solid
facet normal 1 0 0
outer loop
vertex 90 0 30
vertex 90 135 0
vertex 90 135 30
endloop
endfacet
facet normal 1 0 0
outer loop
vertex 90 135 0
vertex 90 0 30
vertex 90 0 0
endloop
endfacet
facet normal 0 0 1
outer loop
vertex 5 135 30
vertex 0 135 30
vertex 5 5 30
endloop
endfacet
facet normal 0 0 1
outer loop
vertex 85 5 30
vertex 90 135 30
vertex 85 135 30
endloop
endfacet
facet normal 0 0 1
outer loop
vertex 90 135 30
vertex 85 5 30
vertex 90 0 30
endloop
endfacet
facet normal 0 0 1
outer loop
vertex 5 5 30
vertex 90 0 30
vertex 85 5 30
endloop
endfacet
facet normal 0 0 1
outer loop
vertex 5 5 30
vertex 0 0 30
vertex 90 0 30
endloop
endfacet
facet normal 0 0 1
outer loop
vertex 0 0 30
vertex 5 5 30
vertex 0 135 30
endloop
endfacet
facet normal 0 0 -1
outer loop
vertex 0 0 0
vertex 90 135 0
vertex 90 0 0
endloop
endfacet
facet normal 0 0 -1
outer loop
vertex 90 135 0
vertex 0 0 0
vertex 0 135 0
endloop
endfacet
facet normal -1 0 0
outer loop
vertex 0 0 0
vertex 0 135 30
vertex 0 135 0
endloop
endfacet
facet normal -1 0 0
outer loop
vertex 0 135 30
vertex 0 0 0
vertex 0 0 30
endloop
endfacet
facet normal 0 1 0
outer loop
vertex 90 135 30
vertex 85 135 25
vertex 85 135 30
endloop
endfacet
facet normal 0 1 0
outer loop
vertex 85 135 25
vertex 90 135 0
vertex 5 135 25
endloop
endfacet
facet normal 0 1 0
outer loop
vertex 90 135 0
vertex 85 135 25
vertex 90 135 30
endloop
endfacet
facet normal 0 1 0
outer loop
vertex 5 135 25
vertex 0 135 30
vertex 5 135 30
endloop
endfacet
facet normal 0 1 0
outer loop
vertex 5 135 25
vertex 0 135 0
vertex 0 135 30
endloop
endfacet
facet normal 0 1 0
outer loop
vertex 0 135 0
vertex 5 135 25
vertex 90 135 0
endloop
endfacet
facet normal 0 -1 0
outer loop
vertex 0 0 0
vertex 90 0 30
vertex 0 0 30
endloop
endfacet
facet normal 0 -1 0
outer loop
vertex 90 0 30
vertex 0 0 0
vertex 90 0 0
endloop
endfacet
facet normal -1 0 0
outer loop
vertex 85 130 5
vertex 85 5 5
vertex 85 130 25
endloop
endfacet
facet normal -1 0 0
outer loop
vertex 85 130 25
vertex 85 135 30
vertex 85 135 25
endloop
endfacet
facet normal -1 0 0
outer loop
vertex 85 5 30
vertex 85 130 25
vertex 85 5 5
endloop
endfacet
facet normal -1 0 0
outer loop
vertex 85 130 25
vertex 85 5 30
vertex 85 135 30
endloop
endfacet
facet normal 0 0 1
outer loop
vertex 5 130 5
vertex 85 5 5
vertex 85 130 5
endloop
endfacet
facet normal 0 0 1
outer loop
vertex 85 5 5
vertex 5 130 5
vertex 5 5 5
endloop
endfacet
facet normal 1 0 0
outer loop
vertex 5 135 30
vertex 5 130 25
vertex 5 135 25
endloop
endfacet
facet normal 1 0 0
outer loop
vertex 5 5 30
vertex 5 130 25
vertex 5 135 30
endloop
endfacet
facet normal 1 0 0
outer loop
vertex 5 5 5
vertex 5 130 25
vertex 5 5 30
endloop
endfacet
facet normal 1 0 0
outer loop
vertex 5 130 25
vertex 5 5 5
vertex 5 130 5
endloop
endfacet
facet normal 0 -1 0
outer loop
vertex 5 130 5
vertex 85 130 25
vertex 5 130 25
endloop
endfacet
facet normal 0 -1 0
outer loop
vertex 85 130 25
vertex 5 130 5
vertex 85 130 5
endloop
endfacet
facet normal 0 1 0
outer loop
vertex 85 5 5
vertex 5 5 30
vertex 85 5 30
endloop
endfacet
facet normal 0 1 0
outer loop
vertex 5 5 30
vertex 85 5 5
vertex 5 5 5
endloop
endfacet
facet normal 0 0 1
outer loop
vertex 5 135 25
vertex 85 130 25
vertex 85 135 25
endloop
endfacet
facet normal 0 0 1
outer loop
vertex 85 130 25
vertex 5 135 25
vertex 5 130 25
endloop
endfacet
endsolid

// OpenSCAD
//Depth inside
numerical_slider = 20; // [10:200]
height=numerical_slider;

module puzzle_container() {
  difference() {
    difference() {
      cube([90,135,height+10]);
      translate([5, 5, 5])
        cube([80,125,height+6]);
    }
    translate([5, 5, height+5])
      cube([80,135,6]);
  }
}
puzzle_container();
